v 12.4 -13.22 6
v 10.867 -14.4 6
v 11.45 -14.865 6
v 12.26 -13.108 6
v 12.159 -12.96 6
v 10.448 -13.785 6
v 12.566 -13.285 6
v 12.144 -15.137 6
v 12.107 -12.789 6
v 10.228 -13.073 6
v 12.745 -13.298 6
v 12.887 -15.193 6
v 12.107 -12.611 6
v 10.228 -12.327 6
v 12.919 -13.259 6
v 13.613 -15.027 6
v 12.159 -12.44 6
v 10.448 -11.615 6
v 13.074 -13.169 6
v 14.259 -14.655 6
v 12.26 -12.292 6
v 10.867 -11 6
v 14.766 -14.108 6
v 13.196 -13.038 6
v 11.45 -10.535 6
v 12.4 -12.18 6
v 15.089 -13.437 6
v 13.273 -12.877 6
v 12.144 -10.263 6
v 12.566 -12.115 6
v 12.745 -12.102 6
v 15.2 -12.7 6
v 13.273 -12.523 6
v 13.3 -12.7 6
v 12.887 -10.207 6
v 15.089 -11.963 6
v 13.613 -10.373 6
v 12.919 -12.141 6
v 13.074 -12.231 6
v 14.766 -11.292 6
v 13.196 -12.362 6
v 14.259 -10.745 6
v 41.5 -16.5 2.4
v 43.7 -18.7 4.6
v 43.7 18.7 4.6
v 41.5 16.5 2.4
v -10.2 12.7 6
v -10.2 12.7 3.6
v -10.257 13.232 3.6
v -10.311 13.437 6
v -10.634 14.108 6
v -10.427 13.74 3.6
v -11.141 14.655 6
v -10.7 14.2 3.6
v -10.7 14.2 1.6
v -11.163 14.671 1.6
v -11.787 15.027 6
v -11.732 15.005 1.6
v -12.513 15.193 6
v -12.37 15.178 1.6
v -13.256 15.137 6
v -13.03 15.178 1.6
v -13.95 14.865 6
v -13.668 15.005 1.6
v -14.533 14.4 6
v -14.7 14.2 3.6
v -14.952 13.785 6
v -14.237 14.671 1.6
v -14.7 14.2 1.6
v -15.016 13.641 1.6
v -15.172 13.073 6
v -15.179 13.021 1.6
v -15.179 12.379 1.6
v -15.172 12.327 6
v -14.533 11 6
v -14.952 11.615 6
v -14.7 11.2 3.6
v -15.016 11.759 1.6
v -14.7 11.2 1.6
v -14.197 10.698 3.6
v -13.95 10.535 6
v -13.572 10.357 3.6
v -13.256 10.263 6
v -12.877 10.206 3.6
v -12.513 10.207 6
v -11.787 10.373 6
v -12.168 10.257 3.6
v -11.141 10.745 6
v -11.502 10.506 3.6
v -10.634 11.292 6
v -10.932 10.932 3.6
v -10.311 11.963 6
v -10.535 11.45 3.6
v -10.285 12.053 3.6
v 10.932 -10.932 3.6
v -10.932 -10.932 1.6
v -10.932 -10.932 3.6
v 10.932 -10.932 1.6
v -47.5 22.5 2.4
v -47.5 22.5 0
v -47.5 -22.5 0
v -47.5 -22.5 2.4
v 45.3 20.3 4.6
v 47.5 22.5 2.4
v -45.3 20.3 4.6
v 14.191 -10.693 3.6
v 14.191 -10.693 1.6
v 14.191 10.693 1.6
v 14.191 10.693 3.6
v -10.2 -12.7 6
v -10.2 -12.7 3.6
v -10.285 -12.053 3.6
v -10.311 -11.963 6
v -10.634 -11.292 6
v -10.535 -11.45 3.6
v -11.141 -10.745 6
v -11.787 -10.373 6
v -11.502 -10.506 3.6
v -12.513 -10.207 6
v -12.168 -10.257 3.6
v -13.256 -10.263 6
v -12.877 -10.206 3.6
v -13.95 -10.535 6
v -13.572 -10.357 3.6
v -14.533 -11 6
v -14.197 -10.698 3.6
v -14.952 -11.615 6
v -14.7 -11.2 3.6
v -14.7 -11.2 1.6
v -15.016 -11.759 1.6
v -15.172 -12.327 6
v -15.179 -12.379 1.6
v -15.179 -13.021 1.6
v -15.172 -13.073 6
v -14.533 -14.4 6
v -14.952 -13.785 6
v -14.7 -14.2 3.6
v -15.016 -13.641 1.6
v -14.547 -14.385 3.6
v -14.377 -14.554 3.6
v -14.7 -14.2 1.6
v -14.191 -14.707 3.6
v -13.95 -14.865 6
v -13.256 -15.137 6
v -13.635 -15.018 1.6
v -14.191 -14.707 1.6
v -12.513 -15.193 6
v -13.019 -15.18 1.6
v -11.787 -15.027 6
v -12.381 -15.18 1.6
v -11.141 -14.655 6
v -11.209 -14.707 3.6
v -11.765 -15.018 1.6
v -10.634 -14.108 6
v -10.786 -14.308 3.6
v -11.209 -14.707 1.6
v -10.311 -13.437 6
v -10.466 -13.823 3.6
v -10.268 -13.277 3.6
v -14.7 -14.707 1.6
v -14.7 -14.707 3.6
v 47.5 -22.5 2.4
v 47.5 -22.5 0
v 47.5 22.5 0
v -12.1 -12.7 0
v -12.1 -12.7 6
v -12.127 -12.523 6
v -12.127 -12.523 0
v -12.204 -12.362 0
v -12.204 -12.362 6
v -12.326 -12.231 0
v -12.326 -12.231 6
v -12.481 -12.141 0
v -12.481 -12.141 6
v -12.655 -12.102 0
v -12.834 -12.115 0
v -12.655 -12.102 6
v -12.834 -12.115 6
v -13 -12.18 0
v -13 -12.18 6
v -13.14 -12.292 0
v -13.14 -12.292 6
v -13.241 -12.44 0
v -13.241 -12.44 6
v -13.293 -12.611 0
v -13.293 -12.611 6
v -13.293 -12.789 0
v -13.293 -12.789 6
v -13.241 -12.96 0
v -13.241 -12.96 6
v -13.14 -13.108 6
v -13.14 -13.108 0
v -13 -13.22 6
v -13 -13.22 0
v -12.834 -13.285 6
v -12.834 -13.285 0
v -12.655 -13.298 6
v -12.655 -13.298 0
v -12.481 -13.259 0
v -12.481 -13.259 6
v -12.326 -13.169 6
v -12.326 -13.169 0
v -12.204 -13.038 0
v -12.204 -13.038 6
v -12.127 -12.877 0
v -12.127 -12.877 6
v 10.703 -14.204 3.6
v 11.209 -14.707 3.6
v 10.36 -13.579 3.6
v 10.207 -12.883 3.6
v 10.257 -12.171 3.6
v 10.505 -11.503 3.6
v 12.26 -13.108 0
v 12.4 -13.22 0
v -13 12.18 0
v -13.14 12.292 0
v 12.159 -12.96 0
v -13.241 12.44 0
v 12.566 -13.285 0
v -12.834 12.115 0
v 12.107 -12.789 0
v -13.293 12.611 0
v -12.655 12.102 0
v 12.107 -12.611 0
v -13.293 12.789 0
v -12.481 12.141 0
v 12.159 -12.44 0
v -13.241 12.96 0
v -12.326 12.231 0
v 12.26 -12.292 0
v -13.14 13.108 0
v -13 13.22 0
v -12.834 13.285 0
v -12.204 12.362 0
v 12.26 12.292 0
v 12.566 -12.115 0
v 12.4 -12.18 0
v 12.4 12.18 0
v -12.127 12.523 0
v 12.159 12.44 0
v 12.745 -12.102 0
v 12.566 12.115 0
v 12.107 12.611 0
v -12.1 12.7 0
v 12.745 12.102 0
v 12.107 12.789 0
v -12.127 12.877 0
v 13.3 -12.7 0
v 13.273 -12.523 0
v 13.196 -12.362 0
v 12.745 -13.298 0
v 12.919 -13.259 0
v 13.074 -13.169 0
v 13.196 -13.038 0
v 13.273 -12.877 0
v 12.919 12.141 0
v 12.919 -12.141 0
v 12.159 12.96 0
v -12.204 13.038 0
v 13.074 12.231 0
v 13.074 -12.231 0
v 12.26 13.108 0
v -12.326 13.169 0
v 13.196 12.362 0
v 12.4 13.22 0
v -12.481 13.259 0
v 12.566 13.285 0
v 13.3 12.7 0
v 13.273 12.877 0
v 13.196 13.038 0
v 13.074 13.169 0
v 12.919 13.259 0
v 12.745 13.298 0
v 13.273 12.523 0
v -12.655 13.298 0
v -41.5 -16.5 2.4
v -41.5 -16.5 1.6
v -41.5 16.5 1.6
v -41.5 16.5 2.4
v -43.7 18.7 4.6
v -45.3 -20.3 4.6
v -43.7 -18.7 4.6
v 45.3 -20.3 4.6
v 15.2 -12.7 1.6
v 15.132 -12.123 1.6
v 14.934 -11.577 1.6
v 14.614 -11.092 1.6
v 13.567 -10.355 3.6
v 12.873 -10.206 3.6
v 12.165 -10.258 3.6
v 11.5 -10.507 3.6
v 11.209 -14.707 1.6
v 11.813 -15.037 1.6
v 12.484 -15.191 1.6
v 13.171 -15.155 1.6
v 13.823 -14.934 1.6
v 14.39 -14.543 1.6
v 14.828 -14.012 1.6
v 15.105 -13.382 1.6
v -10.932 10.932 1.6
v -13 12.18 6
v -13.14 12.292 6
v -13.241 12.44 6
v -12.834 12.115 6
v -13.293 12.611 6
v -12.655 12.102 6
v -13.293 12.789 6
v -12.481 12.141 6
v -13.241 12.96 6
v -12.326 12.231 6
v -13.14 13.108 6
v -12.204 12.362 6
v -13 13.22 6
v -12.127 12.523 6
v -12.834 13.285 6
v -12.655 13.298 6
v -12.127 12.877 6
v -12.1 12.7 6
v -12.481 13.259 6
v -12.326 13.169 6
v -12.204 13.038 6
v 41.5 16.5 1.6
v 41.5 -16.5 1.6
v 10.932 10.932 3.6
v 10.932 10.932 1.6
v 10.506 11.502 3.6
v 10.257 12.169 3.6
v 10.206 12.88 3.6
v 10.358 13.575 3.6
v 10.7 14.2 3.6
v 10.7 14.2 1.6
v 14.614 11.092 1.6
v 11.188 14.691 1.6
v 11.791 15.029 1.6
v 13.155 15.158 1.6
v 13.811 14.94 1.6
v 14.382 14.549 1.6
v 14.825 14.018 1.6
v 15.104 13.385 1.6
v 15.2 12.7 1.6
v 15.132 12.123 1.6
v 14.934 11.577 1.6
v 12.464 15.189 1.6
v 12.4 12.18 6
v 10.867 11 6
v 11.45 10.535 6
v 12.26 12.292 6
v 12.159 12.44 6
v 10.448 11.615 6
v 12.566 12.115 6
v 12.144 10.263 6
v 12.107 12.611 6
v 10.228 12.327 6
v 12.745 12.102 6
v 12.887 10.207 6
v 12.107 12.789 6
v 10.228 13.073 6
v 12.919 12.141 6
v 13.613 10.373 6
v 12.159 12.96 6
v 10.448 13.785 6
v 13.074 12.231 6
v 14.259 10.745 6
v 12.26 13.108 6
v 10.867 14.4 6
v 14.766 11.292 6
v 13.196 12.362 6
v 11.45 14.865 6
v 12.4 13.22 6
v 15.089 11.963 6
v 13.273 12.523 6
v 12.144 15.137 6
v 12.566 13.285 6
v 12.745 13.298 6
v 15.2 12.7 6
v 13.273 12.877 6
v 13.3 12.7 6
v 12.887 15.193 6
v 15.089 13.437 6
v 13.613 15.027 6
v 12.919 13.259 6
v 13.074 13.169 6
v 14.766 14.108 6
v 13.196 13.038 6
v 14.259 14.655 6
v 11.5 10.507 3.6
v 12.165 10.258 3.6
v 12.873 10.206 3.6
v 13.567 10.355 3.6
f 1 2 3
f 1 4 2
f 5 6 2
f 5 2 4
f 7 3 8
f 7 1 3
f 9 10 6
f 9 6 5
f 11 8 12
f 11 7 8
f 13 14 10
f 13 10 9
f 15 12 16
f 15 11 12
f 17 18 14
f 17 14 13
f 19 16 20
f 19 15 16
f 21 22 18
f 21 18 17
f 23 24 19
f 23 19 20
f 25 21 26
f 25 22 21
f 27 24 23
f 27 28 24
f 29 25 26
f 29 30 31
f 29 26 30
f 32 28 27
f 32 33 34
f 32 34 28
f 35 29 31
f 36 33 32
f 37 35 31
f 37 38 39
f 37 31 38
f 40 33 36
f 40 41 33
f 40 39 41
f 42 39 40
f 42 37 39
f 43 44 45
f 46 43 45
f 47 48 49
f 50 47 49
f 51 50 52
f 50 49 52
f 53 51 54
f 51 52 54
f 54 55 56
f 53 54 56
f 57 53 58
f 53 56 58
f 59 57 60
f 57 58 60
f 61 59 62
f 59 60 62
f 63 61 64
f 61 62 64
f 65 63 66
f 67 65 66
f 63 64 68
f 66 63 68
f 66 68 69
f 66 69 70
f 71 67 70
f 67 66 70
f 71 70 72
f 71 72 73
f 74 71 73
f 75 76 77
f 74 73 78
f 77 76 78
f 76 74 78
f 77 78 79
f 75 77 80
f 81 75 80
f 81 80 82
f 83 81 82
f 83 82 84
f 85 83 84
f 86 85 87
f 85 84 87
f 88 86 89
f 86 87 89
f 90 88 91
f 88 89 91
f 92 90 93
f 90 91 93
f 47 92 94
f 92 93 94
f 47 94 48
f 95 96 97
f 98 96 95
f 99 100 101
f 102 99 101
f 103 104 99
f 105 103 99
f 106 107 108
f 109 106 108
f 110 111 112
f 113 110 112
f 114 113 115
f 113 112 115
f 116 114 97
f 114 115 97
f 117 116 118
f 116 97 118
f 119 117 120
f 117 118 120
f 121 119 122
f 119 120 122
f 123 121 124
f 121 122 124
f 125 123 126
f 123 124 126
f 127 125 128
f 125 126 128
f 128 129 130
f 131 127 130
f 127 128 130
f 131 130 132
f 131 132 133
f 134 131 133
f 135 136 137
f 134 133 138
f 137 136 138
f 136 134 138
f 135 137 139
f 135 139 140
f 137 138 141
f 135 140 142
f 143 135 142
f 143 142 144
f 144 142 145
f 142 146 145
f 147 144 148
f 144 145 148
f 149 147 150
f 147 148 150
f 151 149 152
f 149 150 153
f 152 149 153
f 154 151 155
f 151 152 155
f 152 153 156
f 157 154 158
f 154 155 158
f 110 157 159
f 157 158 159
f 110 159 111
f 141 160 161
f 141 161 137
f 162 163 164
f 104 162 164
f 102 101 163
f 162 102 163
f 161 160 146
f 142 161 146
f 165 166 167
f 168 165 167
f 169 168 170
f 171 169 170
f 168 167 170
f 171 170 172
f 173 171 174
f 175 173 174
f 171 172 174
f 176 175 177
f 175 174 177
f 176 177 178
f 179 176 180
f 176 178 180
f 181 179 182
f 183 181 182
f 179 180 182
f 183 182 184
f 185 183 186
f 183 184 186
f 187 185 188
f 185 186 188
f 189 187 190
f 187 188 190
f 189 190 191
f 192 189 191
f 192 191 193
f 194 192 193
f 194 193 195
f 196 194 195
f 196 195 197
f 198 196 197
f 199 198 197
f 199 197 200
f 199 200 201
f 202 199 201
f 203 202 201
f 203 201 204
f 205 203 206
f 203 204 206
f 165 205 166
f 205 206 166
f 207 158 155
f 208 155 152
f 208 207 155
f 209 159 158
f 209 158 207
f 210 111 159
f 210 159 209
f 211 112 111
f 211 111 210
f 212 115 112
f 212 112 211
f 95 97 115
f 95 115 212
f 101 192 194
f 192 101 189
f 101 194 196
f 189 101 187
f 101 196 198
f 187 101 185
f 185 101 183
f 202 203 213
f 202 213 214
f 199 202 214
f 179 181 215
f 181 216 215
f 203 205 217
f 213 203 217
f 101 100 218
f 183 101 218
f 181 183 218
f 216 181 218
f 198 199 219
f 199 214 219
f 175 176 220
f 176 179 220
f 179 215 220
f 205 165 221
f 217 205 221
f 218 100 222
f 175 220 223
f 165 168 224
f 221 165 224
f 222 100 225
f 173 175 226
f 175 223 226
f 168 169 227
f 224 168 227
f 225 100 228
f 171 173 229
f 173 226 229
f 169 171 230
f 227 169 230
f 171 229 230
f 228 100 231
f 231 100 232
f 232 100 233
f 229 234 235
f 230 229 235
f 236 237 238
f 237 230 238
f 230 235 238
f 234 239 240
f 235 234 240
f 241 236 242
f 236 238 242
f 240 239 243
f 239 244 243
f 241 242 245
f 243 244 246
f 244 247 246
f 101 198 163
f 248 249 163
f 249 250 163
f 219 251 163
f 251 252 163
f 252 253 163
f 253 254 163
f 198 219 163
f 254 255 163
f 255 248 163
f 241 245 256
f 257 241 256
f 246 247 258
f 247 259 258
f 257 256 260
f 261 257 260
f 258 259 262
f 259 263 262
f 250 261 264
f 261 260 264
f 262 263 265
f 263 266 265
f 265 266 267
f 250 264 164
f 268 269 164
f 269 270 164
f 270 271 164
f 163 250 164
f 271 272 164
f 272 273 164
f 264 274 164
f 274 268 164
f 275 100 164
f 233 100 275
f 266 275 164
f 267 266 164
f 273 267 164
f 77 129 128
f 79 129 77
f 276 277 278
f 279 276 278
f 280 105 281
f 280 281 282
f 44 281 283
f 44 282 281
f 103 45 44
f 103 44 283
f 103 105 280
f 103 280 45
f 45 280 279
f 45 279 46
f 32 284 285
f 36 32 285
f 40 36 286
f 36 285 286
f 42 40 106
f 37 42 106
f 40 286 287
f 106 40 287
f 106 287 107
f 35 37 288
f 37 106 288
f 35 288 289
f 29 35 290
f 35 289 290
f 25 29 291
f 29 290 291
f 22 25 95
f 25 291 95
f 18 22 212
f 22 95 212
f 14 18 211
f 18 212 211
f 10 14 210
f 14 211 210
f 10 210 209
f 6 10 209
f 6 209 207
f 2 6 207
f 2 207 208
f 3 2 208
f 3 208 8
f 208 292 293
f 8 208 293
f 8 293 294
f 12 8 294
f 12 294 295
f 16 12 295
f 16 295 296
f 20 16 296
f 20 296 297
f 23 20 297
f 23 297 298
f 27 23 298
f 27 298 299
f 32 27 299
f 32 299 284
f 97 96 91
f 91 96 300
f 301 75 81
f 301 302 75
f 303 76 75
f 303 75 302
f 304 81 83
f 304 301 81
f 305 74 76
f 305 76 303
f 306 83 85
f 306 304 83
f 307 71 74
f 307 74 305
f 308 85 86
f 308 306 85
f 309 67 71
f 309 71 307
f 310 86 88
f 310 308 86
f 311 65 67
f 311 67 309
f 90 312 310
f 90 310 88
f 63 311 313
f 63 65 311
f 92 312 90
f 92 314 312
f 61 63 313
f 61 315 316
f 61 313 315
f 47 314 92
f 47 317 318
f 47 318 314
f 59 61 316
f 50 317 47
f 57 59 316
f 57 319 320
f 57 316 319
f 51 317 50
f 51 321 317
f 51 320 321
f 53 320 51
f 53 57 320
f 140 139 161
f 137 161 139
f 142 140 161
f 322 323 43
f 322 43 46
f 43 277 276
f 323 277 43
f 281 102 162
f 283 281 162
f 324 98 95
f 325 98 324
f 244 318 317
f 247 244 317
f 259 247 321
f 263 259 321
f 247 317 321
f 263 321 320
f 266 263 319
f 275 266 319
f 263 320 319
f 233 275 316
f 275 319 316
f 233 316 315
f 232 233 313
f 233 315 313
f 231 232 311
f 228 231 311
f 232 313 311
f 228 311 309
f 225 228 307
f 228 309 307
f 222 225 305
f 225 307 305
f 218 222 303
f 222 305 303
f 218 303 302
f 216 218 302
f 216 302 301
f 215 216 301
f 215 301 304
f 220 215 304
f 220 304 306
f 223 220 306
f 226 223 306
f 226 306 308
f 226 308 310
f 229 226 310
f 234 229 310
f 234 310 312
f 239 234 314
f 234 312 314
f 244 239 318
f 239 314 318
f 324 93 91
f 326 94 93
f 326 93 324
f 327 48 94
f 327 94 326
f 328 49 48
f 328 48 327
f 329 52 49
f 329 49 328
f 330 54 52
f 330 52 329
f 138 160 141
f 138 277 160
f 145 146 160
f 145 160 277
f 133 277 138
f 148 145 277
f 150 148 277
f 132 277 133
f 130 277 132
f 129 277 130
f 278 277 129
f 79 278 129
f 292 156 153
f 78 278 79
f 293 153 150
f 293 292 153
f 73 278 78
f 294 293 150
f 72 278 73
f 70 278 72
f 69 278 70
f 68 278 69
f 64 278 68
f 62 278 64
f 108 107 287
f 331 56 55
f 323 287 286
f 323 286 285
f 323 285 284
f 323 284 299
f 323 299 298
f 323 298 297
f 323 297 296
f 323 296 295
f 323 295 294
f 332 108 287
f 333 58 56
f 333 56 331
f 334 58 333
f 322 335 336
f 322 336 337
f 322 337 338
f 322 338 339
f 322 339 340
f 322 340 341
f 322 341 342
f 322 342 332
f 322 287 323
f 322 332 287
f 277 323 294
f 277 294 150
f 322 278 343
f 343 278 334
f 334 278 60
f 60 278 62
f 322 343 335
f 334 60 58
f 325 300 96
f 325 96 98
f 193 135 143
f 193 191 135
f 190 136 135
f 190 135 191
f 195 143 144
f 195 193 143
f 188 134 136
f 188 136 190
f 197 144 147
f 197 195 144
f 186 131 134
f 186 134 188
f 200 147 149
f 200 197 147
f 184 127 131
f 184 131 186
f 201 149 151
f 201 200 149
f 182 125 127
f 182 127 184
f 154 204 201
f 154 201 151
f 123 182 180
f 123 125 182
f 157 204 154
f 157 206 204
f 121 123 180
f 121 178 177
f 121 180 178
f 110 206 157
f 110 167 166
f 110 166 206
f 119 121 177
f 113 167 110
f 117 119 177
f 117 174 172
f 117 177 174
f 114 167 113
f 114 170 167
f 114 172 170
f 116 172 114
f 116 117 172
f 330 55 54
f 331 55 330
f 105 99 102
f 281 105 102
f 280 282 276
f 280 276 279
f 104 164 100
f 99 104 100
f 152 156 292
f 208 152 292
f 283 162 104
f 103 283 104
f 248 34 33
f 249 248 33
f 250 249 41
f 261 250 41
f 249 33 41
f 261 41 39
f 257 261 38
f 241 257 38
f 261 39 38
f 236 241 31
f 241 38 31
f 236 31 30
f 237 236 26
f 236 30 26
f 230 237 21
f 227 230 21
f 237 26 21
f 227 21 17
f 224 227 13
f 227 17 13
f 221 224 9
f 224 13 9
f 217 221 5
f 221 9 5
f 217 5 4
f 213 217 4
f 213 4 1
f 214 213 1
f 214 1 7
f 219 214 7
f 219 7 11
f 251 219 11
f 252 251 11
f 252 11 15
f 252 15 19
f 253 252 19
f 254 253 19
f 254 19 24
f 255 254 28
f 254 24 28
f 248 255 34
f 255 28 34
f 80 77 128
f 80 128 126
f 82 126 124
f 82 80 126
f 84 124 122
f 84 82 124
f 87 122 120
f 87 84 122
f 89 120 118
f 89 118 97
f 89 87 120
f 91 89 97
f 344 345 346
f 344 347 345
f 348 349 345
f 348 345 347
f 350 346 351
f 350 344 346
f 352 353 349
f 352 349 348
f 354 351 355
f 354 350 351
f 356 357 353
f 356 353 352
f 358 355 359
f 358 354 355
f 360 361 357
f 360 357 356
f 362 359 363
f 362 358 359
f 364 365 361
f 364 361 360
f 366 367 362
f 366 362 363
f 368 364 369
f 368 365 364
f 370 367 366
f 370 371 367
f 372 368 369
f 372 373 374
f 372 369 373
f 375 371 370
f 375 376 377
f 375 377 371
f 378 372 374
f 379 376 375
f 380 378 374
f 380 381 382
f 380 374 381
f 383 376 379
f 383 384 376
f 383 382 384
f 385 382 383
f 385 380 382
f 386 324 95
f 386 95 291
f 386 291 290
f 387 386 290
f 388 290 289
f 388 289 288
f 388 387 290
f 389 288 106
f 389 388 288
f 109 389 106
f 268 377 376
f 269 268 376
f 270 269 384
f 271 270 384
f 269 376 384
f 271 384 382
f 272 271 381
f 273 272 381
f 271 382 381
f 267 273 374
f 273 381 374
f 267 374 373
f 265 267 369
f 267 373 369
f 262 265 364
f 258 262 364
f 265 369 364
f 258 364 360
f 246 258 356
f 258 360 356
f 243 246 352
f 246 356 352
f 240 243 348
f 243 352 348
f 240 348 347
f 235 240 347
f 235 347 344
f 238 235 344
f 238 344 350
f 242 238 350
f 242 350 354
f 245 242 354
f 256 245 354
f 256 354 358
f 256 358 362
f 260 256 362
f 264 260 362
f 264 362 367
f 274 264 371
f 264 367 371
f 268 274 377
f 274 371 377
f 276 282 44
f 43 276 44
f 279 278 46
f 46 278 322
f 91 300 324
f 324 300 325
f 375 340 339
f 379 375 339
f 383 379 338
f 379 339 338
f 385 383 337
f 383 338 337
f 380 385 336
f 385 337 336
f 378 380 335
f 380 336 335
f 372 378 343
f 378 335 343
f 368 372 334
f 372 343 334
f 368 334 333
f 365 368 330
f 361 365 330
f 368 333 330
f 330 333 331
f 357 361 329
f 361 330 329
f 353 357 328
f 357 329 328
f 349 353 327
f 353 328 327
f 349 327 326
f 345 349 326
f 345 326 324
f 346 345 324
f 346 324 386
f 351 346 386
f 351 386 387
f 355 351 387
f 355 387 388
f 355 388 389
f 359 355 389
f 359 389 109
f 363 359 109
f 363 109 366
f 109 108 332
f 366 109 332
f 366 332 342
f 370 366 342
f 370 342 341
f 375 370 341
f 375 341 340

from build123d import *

# Parameters (mm, degrees)
F0_W     = 89
F0_H     = 45
F0_R     = 2.5
F0_W_2   = 3
F1_DEPTH = 1.6
F2_DEPTH = 6
F3_W     = 6
F3_H     = 6
F3_W_2   = 83
F3_H_2   = 33
F4_DEPTH = 3
F5_W     = 28.891159
F5_H     = 28.9066
F5_W_2   = 21.864466
F5_H_2   = 21.864466
F6_DEPTH = 2
F7_R     = 0.6
F8_DEPTH = 6
F9_SIZE  = 2.2


with BuildPart() as f1:
    # F0 (on Top) → F1 (new body)
    with BuildSketch(Plane.XY):
        Rectangle(F0_W, F0_H)
        with Locations((-12.7, -12.7)):
            Circle(F0_R, mode=Mode.SUBTRACT)
        with Locations((12.7, -12.7)):
            Circle(F0_R, mode=Mode.SUBTRACT)
        with Locations((-12.7, 12.7)):
            Circle(F0_R, mode=Mode.SUBTRACT)
        with Locations((12.7, 12.7)):
            Circle(F0_R, mode=Mode.SUBTRACT)
        with Locations((46, 0)):
            Rectangle(F0_W_2, F0_H)
        with Locations((-46, 0)):
            Rectangle(F0_W_2, F0_H)
        with Locations((-12.7, 12.7)):
            Circle(F0_R)
        with Locations((12.7, 12.7)):
            Circle(F0_R)
        with Locations((12.7, -12.7)):
            Circle(F0_R)
        with Locations((-12.7, -12.7)):
            Circle(F0_R)
    extrude(amount=F1_DEPTH)

    # F0 (on Top) → F2 (join)
    with BuildSketch(Plane.XY):
        with Locations((-12.7, -12.7)):
            Circle(F0_R)
        with Locations((-12.7, 12.7)):
            Circle(F0_R)
        with Locations((12.7, -12.7)):
            Circle(F0_R)
        with Locations((12.7, 12.7)):
            Circle(F0_R)
    extrude(amount=F2_DEPTH)

    # F3 (on face) → F4 (join)
    with BuildSketch(Plane.XY.offset(1.6)):
        with Locations((-44.5, 19.5)):
            Rectangle(F3_W, F3_H)
        with Locations((0, 19.5)):
            Rectangle(F3_W_2, F3_H)
        with Locations((-44.5, 0)):
            Rectangle(F3_W, F3_H_2)
        with Locations((44.5, 19.5)):
            Rectangle(F3_W, F3_H)
        with Locations((-44.5, -19.5)):
            Rectangle(F3_W, F3_H)
        with Locations((44.5, 0)):
            Rectangle(F3_W, F3_H_2)
        with Locations((0, -19.5)):
            Rectangle(F3_W_2, F3_H)
        with Locations((44.5, -19.5)):
            Rectangle(F3_W, F3_H)
    extrude(amount=F4_DEPTH)

    # F5 (on face) → F6 (join)
    with BuildSketch(Plane.XY.offset(1.6)):
        with Locations((-0.254421, -0.2533)):
            Rectangle(F5_W, F5_H)
        Rectangle(F5_W_2, F5_H_2, mode=Mode.SUBTRACT)
    extrude(amount=F6_DEPTH)

    # F7 (on face) → F8 (cut)
    with BuildSketch(Plane.XY.offset(6)):
        with Locations((-12.7, 12.7)):
            Circle(F7_R)
        with Locations((12.7, 12.7)):
            Circle(F7_R)
        with Locations((12.7, -12.7)):
            Circle(F7_R)
        with Locations((-12.7, -12.7)):
            Circle(F7_R)
    extrude(amount=-F8_DEPTH, mode=Mode.SUBTRACT)

    # F9
    f9_edges = [f1.edges().sort_by_distance(p)[0] for p in [
        (0, 16.5, 4.6),
        (-41.5, 0, 4.6),
        (-47.5, 0, 4.6),
        (0, 22.5, 4.6),
        (0, -22.5, 4.6),
        (47.5, 0, 4.6),
        (41.5, 0, 4.6),
        (0, -16.5, 4.6),
    ]]
    chamfer(f9_edges, length=F9_SIZE)


solid = f1.part
